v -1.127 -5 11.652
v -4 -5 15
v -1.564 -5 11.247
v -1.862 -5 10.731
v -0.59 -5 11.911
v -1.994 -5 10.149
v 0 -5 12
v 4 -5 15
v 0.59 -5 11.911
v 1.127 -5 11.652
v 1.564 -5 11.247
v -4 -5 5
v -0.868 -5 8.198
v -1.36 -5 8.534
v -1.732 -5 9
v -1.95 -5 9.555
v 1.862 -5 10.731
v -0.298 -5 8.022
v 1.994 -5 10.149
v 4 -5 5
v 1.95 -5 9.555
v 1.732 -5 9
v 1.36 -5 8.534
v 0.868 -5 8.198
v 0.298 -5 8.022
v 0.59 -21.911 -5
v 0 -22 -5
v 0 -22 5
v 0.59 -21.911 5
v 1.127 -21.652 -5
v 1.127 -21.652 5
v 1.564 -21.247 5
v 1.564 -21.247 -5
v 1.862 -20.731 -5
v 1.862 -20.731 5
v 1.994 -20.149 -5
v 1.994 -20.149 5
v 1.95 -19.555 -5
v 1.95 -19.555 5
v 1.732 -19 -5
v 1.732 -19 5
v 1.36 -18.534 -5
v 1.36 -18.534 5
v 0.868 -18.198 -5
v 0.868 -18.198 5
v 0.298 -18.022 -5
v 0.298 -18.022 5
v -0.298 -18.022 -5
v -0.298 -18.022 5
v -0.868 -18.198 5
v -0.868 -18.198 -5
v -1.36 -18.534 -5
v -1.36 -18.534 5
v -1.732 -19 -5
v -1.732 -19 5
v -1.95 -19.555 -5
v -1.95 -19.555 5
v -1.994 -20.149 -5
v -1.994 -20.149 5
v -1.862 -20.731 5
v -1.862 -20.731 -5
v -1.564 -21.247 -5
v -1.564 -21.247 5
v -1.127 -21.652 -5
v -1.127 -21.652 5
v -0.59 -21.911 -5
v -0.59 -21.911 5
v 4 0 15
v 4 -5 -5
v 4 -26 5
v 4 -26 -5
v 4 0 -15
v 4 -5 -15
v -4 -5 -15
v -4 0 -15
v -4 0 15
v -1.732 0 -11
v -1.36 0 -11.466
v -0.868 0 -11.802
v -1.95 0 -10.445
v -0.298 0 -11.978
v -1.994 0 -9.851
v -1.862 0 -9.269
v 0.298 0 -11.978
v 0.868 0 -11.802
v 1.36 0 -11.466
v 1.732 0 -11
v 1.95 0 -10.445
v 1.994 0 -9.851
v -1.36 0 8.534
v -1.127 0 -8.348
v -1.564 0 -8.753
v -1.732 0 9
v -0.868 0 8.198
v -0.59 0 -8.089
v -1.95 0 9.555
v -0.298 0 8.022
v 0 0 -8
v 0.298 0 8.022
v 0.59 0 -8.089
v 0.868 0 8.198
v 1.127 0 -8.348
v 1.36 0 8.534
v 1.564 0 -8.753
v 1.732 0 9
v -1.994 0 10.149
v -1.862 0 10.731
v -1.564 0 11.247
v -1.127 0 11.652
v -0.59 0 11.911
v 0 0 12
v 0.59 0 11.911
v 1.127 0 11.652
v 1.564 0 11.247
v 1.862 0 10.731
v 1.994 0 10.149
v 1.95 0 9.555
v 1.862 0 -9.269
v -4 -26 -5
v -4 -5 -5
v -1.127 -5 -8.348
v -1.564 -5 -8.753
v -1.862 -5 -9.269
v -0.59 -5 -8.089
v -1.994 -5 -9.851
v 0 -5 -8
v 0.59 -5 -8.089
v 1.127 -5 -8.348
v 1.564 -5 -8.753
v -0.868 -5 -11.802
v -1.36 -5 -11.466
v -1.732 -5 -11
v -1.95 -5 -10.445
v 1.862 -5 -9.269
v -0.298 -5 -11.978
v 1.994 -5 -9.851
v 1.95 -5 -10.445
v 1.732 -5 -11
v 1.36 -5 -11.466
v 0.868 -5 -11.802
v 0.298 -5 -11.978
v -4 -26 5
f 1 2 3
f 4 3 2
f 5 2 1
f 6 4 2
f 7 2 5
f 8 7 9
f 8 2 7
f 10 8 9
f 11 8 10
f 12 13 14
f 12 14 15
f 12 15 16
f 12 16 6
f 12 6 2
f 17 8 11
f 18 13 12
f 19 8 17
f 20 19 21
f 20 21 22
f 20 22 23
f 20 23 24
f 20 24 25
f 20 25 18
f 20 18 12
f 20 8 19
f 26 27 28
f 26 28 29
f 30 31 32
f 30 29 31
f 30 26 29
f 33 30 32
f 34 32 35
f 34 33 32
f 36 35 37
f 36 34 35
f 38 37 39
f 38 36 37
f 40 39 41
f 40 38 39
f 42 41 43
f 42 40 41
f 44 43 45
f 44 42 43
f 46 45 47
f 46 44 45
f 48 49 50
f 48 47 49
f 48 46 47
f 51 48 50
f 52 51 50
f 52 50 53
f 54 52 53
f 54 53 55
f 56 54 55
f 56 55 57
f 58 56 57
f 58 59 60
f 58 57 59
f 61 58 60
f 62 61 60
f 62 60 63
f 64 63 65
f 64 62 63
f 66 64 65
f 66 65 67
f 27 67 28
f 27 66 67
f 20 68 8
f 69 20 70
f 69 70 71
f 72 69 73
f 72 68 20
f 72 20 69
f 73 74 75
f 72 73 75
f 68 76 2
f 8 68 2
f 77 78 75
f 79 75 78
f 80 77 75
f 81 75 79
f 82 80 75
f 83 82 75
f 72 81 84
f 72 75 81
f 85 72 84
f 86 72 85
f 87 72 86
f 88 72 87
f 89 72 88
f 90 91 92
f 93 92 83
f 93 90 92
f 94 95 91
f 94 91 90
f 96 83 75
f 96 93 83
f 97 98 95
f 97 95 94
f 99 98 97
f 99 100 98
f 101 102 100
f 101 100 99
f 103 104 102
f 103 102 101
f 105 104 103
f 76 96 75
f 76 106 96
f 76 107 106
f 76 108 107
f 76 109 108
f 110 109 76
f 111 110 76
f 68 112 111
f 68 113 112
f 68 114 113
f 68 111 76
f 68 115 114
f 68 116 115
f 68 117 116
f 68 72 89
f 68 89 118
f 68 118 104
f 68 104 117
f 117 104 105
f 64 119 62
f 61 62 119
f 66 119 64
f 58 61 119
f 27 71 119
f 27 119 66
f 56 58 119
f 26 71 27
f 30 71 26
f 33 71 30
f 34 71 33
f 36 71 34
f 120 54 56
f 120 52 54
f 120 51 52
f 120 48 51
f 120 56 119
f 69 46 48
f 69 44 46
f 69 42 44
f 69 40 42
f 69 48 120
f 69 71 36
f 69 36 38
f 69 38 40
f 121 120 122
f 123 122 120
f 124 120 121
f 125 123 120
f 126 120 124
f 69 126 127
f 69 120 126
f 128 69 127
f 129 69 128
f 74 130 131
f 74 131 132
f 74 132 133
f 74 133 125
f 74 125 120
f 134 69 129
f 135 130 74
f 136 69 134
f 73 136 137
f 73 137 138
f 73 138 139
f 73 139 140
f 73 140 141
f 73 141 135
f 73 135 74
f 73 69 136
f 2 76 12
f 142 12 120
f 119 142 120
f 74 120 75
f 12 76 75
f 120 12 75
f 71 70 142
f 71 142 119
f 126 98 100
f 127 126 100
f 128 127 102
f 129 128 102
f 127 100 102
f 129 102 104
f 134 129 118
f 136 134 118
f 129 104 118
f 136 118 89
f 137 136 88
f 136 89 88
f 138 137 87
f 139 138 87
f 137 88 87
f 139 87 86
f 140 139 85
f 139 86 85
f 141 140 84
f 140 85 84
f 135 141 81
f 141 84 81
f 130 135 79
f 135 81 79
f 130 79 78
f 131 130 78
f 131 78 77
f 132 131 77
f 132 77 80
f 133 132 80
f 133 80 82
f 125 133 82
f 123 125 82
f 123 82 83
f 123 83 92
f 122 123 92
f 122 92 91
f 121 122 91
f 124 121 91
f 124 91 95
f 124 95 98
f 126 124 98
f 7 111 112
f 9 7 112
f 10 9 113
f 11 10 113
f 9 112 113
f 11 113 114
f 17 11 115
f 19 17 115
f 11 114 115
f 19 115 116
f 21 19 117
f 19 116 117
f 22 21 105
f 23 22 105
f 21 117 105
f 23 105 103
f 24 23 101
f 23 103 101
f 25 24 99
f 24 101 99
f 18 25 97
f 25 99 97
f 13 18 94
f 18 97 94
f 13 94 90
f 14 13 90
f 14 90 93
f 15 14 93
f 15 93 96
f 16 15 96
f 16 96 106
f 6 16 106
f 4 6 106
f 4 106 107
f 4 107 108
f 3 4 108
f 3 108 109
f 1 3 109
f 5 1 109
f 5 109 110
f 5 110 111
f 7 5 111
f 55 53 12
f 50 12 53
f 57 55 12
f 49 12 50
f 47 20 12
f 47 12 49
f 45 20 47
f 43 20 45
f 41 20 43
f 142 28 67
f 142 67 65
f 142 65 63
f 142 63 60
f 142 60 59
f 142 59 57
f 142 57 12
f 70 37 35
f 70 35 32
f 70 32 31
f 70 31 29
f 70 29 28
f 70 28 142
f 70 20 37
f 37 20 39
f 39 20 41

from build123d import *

# Parameters (mm, degrees)
EXTRUDE_1_DEPTH          = 4
CUT_EXTRUDE_1_REACH      = 32.282
SKETCH_2_R               = 2
CUT_EXTRUDE_2_DEPTH      = 31.282007859
CUT_EXTRUDE_2_DEPTH_BACK = 31.282007859
SKETCH_3_R               = 2


with BuildPart() as part:
    # 草图1 → 凸台-拉伸1 (new, symmetric)
    with BuildSketch(Plane(origin=(0, 0, 0), x_dir=(0, 0, -1), z_dir=(1, 0, 0))):
        Polygon((-15, 0), (-15, -5), (-5, -5), (-5, -26), (5, -26), (5, -5), (15, -5), (15, 0), (0, 0), align=None)
    extrude(amount=EXTRUDE_1_DEPTH, both=True)

    # 草图2 → 切除-拉伸1 (cut, up to next)
    with BuildSketch(Plane(origin=(0, 0, 0), x_dir=(1, 0, 0), z_dir=(0, 1, 0)), mode=Mode.PRIVATE) as cut_extrude_1_sk1:
        with Locations(Location((0, 10, 0), (0, 0, 270))):
            Circle(SKETCH_2_R)
    cut_extrude_1_tool1 = extrude(cut_extrude_1_sk1.sketch, amount=-CUT_EXTRUDE_1_REACH, mode=Mode.PRIVATE) & part.part
    # 草图2 → 切除-拉伸1 (cut, up to next)
    with BuildSketch(Plane(origin=(0, 0, 0), x_dir=(1, 0, 0), z_dir=(0, 1, 0)), mode=Mode.PRIVATE) as cut_extrude_1_sk2:
        with Locations(Location((0, -10, 0), (0, 0, 270))):
            Circle(SKETCH_2_R)
    cut_extrude_1_tool2 = extrude(cut_extrude_1_sk2.sketch, amount=-CUT_EXTRUDE_1_REACH, mode=Mode.PRIVATE) & part.part
    add(cut_extrude_1_tool1.solids().sort_by_distance((0, 0, -10))[0], mode=Mode.SUBTRACT)
    add(cut_extrude_1_tool2.solids().sort_by_distance((0, 0, 10))[0], mode=Mode.SUBTRACT)

    # 草图3 → 切除-拉伸2 (cut, two sides: drawn at the far end of the back side and taken through both)
    with BuildSketch(Plane.XY.offset(-CUT_EXTRUDE_2_DEPTH_BACK)):
        with Locations(Location((0, -20, 0), (0, 0, 270))):
            Circle(SKETCH_3_R)
    extrude(amount=CUT_EXTRUDE_2_DEPTH + CUT_EXTRUDE_2_DEPTH_BACK, mode=Mode.SUBTRACT)


solid = part.part
